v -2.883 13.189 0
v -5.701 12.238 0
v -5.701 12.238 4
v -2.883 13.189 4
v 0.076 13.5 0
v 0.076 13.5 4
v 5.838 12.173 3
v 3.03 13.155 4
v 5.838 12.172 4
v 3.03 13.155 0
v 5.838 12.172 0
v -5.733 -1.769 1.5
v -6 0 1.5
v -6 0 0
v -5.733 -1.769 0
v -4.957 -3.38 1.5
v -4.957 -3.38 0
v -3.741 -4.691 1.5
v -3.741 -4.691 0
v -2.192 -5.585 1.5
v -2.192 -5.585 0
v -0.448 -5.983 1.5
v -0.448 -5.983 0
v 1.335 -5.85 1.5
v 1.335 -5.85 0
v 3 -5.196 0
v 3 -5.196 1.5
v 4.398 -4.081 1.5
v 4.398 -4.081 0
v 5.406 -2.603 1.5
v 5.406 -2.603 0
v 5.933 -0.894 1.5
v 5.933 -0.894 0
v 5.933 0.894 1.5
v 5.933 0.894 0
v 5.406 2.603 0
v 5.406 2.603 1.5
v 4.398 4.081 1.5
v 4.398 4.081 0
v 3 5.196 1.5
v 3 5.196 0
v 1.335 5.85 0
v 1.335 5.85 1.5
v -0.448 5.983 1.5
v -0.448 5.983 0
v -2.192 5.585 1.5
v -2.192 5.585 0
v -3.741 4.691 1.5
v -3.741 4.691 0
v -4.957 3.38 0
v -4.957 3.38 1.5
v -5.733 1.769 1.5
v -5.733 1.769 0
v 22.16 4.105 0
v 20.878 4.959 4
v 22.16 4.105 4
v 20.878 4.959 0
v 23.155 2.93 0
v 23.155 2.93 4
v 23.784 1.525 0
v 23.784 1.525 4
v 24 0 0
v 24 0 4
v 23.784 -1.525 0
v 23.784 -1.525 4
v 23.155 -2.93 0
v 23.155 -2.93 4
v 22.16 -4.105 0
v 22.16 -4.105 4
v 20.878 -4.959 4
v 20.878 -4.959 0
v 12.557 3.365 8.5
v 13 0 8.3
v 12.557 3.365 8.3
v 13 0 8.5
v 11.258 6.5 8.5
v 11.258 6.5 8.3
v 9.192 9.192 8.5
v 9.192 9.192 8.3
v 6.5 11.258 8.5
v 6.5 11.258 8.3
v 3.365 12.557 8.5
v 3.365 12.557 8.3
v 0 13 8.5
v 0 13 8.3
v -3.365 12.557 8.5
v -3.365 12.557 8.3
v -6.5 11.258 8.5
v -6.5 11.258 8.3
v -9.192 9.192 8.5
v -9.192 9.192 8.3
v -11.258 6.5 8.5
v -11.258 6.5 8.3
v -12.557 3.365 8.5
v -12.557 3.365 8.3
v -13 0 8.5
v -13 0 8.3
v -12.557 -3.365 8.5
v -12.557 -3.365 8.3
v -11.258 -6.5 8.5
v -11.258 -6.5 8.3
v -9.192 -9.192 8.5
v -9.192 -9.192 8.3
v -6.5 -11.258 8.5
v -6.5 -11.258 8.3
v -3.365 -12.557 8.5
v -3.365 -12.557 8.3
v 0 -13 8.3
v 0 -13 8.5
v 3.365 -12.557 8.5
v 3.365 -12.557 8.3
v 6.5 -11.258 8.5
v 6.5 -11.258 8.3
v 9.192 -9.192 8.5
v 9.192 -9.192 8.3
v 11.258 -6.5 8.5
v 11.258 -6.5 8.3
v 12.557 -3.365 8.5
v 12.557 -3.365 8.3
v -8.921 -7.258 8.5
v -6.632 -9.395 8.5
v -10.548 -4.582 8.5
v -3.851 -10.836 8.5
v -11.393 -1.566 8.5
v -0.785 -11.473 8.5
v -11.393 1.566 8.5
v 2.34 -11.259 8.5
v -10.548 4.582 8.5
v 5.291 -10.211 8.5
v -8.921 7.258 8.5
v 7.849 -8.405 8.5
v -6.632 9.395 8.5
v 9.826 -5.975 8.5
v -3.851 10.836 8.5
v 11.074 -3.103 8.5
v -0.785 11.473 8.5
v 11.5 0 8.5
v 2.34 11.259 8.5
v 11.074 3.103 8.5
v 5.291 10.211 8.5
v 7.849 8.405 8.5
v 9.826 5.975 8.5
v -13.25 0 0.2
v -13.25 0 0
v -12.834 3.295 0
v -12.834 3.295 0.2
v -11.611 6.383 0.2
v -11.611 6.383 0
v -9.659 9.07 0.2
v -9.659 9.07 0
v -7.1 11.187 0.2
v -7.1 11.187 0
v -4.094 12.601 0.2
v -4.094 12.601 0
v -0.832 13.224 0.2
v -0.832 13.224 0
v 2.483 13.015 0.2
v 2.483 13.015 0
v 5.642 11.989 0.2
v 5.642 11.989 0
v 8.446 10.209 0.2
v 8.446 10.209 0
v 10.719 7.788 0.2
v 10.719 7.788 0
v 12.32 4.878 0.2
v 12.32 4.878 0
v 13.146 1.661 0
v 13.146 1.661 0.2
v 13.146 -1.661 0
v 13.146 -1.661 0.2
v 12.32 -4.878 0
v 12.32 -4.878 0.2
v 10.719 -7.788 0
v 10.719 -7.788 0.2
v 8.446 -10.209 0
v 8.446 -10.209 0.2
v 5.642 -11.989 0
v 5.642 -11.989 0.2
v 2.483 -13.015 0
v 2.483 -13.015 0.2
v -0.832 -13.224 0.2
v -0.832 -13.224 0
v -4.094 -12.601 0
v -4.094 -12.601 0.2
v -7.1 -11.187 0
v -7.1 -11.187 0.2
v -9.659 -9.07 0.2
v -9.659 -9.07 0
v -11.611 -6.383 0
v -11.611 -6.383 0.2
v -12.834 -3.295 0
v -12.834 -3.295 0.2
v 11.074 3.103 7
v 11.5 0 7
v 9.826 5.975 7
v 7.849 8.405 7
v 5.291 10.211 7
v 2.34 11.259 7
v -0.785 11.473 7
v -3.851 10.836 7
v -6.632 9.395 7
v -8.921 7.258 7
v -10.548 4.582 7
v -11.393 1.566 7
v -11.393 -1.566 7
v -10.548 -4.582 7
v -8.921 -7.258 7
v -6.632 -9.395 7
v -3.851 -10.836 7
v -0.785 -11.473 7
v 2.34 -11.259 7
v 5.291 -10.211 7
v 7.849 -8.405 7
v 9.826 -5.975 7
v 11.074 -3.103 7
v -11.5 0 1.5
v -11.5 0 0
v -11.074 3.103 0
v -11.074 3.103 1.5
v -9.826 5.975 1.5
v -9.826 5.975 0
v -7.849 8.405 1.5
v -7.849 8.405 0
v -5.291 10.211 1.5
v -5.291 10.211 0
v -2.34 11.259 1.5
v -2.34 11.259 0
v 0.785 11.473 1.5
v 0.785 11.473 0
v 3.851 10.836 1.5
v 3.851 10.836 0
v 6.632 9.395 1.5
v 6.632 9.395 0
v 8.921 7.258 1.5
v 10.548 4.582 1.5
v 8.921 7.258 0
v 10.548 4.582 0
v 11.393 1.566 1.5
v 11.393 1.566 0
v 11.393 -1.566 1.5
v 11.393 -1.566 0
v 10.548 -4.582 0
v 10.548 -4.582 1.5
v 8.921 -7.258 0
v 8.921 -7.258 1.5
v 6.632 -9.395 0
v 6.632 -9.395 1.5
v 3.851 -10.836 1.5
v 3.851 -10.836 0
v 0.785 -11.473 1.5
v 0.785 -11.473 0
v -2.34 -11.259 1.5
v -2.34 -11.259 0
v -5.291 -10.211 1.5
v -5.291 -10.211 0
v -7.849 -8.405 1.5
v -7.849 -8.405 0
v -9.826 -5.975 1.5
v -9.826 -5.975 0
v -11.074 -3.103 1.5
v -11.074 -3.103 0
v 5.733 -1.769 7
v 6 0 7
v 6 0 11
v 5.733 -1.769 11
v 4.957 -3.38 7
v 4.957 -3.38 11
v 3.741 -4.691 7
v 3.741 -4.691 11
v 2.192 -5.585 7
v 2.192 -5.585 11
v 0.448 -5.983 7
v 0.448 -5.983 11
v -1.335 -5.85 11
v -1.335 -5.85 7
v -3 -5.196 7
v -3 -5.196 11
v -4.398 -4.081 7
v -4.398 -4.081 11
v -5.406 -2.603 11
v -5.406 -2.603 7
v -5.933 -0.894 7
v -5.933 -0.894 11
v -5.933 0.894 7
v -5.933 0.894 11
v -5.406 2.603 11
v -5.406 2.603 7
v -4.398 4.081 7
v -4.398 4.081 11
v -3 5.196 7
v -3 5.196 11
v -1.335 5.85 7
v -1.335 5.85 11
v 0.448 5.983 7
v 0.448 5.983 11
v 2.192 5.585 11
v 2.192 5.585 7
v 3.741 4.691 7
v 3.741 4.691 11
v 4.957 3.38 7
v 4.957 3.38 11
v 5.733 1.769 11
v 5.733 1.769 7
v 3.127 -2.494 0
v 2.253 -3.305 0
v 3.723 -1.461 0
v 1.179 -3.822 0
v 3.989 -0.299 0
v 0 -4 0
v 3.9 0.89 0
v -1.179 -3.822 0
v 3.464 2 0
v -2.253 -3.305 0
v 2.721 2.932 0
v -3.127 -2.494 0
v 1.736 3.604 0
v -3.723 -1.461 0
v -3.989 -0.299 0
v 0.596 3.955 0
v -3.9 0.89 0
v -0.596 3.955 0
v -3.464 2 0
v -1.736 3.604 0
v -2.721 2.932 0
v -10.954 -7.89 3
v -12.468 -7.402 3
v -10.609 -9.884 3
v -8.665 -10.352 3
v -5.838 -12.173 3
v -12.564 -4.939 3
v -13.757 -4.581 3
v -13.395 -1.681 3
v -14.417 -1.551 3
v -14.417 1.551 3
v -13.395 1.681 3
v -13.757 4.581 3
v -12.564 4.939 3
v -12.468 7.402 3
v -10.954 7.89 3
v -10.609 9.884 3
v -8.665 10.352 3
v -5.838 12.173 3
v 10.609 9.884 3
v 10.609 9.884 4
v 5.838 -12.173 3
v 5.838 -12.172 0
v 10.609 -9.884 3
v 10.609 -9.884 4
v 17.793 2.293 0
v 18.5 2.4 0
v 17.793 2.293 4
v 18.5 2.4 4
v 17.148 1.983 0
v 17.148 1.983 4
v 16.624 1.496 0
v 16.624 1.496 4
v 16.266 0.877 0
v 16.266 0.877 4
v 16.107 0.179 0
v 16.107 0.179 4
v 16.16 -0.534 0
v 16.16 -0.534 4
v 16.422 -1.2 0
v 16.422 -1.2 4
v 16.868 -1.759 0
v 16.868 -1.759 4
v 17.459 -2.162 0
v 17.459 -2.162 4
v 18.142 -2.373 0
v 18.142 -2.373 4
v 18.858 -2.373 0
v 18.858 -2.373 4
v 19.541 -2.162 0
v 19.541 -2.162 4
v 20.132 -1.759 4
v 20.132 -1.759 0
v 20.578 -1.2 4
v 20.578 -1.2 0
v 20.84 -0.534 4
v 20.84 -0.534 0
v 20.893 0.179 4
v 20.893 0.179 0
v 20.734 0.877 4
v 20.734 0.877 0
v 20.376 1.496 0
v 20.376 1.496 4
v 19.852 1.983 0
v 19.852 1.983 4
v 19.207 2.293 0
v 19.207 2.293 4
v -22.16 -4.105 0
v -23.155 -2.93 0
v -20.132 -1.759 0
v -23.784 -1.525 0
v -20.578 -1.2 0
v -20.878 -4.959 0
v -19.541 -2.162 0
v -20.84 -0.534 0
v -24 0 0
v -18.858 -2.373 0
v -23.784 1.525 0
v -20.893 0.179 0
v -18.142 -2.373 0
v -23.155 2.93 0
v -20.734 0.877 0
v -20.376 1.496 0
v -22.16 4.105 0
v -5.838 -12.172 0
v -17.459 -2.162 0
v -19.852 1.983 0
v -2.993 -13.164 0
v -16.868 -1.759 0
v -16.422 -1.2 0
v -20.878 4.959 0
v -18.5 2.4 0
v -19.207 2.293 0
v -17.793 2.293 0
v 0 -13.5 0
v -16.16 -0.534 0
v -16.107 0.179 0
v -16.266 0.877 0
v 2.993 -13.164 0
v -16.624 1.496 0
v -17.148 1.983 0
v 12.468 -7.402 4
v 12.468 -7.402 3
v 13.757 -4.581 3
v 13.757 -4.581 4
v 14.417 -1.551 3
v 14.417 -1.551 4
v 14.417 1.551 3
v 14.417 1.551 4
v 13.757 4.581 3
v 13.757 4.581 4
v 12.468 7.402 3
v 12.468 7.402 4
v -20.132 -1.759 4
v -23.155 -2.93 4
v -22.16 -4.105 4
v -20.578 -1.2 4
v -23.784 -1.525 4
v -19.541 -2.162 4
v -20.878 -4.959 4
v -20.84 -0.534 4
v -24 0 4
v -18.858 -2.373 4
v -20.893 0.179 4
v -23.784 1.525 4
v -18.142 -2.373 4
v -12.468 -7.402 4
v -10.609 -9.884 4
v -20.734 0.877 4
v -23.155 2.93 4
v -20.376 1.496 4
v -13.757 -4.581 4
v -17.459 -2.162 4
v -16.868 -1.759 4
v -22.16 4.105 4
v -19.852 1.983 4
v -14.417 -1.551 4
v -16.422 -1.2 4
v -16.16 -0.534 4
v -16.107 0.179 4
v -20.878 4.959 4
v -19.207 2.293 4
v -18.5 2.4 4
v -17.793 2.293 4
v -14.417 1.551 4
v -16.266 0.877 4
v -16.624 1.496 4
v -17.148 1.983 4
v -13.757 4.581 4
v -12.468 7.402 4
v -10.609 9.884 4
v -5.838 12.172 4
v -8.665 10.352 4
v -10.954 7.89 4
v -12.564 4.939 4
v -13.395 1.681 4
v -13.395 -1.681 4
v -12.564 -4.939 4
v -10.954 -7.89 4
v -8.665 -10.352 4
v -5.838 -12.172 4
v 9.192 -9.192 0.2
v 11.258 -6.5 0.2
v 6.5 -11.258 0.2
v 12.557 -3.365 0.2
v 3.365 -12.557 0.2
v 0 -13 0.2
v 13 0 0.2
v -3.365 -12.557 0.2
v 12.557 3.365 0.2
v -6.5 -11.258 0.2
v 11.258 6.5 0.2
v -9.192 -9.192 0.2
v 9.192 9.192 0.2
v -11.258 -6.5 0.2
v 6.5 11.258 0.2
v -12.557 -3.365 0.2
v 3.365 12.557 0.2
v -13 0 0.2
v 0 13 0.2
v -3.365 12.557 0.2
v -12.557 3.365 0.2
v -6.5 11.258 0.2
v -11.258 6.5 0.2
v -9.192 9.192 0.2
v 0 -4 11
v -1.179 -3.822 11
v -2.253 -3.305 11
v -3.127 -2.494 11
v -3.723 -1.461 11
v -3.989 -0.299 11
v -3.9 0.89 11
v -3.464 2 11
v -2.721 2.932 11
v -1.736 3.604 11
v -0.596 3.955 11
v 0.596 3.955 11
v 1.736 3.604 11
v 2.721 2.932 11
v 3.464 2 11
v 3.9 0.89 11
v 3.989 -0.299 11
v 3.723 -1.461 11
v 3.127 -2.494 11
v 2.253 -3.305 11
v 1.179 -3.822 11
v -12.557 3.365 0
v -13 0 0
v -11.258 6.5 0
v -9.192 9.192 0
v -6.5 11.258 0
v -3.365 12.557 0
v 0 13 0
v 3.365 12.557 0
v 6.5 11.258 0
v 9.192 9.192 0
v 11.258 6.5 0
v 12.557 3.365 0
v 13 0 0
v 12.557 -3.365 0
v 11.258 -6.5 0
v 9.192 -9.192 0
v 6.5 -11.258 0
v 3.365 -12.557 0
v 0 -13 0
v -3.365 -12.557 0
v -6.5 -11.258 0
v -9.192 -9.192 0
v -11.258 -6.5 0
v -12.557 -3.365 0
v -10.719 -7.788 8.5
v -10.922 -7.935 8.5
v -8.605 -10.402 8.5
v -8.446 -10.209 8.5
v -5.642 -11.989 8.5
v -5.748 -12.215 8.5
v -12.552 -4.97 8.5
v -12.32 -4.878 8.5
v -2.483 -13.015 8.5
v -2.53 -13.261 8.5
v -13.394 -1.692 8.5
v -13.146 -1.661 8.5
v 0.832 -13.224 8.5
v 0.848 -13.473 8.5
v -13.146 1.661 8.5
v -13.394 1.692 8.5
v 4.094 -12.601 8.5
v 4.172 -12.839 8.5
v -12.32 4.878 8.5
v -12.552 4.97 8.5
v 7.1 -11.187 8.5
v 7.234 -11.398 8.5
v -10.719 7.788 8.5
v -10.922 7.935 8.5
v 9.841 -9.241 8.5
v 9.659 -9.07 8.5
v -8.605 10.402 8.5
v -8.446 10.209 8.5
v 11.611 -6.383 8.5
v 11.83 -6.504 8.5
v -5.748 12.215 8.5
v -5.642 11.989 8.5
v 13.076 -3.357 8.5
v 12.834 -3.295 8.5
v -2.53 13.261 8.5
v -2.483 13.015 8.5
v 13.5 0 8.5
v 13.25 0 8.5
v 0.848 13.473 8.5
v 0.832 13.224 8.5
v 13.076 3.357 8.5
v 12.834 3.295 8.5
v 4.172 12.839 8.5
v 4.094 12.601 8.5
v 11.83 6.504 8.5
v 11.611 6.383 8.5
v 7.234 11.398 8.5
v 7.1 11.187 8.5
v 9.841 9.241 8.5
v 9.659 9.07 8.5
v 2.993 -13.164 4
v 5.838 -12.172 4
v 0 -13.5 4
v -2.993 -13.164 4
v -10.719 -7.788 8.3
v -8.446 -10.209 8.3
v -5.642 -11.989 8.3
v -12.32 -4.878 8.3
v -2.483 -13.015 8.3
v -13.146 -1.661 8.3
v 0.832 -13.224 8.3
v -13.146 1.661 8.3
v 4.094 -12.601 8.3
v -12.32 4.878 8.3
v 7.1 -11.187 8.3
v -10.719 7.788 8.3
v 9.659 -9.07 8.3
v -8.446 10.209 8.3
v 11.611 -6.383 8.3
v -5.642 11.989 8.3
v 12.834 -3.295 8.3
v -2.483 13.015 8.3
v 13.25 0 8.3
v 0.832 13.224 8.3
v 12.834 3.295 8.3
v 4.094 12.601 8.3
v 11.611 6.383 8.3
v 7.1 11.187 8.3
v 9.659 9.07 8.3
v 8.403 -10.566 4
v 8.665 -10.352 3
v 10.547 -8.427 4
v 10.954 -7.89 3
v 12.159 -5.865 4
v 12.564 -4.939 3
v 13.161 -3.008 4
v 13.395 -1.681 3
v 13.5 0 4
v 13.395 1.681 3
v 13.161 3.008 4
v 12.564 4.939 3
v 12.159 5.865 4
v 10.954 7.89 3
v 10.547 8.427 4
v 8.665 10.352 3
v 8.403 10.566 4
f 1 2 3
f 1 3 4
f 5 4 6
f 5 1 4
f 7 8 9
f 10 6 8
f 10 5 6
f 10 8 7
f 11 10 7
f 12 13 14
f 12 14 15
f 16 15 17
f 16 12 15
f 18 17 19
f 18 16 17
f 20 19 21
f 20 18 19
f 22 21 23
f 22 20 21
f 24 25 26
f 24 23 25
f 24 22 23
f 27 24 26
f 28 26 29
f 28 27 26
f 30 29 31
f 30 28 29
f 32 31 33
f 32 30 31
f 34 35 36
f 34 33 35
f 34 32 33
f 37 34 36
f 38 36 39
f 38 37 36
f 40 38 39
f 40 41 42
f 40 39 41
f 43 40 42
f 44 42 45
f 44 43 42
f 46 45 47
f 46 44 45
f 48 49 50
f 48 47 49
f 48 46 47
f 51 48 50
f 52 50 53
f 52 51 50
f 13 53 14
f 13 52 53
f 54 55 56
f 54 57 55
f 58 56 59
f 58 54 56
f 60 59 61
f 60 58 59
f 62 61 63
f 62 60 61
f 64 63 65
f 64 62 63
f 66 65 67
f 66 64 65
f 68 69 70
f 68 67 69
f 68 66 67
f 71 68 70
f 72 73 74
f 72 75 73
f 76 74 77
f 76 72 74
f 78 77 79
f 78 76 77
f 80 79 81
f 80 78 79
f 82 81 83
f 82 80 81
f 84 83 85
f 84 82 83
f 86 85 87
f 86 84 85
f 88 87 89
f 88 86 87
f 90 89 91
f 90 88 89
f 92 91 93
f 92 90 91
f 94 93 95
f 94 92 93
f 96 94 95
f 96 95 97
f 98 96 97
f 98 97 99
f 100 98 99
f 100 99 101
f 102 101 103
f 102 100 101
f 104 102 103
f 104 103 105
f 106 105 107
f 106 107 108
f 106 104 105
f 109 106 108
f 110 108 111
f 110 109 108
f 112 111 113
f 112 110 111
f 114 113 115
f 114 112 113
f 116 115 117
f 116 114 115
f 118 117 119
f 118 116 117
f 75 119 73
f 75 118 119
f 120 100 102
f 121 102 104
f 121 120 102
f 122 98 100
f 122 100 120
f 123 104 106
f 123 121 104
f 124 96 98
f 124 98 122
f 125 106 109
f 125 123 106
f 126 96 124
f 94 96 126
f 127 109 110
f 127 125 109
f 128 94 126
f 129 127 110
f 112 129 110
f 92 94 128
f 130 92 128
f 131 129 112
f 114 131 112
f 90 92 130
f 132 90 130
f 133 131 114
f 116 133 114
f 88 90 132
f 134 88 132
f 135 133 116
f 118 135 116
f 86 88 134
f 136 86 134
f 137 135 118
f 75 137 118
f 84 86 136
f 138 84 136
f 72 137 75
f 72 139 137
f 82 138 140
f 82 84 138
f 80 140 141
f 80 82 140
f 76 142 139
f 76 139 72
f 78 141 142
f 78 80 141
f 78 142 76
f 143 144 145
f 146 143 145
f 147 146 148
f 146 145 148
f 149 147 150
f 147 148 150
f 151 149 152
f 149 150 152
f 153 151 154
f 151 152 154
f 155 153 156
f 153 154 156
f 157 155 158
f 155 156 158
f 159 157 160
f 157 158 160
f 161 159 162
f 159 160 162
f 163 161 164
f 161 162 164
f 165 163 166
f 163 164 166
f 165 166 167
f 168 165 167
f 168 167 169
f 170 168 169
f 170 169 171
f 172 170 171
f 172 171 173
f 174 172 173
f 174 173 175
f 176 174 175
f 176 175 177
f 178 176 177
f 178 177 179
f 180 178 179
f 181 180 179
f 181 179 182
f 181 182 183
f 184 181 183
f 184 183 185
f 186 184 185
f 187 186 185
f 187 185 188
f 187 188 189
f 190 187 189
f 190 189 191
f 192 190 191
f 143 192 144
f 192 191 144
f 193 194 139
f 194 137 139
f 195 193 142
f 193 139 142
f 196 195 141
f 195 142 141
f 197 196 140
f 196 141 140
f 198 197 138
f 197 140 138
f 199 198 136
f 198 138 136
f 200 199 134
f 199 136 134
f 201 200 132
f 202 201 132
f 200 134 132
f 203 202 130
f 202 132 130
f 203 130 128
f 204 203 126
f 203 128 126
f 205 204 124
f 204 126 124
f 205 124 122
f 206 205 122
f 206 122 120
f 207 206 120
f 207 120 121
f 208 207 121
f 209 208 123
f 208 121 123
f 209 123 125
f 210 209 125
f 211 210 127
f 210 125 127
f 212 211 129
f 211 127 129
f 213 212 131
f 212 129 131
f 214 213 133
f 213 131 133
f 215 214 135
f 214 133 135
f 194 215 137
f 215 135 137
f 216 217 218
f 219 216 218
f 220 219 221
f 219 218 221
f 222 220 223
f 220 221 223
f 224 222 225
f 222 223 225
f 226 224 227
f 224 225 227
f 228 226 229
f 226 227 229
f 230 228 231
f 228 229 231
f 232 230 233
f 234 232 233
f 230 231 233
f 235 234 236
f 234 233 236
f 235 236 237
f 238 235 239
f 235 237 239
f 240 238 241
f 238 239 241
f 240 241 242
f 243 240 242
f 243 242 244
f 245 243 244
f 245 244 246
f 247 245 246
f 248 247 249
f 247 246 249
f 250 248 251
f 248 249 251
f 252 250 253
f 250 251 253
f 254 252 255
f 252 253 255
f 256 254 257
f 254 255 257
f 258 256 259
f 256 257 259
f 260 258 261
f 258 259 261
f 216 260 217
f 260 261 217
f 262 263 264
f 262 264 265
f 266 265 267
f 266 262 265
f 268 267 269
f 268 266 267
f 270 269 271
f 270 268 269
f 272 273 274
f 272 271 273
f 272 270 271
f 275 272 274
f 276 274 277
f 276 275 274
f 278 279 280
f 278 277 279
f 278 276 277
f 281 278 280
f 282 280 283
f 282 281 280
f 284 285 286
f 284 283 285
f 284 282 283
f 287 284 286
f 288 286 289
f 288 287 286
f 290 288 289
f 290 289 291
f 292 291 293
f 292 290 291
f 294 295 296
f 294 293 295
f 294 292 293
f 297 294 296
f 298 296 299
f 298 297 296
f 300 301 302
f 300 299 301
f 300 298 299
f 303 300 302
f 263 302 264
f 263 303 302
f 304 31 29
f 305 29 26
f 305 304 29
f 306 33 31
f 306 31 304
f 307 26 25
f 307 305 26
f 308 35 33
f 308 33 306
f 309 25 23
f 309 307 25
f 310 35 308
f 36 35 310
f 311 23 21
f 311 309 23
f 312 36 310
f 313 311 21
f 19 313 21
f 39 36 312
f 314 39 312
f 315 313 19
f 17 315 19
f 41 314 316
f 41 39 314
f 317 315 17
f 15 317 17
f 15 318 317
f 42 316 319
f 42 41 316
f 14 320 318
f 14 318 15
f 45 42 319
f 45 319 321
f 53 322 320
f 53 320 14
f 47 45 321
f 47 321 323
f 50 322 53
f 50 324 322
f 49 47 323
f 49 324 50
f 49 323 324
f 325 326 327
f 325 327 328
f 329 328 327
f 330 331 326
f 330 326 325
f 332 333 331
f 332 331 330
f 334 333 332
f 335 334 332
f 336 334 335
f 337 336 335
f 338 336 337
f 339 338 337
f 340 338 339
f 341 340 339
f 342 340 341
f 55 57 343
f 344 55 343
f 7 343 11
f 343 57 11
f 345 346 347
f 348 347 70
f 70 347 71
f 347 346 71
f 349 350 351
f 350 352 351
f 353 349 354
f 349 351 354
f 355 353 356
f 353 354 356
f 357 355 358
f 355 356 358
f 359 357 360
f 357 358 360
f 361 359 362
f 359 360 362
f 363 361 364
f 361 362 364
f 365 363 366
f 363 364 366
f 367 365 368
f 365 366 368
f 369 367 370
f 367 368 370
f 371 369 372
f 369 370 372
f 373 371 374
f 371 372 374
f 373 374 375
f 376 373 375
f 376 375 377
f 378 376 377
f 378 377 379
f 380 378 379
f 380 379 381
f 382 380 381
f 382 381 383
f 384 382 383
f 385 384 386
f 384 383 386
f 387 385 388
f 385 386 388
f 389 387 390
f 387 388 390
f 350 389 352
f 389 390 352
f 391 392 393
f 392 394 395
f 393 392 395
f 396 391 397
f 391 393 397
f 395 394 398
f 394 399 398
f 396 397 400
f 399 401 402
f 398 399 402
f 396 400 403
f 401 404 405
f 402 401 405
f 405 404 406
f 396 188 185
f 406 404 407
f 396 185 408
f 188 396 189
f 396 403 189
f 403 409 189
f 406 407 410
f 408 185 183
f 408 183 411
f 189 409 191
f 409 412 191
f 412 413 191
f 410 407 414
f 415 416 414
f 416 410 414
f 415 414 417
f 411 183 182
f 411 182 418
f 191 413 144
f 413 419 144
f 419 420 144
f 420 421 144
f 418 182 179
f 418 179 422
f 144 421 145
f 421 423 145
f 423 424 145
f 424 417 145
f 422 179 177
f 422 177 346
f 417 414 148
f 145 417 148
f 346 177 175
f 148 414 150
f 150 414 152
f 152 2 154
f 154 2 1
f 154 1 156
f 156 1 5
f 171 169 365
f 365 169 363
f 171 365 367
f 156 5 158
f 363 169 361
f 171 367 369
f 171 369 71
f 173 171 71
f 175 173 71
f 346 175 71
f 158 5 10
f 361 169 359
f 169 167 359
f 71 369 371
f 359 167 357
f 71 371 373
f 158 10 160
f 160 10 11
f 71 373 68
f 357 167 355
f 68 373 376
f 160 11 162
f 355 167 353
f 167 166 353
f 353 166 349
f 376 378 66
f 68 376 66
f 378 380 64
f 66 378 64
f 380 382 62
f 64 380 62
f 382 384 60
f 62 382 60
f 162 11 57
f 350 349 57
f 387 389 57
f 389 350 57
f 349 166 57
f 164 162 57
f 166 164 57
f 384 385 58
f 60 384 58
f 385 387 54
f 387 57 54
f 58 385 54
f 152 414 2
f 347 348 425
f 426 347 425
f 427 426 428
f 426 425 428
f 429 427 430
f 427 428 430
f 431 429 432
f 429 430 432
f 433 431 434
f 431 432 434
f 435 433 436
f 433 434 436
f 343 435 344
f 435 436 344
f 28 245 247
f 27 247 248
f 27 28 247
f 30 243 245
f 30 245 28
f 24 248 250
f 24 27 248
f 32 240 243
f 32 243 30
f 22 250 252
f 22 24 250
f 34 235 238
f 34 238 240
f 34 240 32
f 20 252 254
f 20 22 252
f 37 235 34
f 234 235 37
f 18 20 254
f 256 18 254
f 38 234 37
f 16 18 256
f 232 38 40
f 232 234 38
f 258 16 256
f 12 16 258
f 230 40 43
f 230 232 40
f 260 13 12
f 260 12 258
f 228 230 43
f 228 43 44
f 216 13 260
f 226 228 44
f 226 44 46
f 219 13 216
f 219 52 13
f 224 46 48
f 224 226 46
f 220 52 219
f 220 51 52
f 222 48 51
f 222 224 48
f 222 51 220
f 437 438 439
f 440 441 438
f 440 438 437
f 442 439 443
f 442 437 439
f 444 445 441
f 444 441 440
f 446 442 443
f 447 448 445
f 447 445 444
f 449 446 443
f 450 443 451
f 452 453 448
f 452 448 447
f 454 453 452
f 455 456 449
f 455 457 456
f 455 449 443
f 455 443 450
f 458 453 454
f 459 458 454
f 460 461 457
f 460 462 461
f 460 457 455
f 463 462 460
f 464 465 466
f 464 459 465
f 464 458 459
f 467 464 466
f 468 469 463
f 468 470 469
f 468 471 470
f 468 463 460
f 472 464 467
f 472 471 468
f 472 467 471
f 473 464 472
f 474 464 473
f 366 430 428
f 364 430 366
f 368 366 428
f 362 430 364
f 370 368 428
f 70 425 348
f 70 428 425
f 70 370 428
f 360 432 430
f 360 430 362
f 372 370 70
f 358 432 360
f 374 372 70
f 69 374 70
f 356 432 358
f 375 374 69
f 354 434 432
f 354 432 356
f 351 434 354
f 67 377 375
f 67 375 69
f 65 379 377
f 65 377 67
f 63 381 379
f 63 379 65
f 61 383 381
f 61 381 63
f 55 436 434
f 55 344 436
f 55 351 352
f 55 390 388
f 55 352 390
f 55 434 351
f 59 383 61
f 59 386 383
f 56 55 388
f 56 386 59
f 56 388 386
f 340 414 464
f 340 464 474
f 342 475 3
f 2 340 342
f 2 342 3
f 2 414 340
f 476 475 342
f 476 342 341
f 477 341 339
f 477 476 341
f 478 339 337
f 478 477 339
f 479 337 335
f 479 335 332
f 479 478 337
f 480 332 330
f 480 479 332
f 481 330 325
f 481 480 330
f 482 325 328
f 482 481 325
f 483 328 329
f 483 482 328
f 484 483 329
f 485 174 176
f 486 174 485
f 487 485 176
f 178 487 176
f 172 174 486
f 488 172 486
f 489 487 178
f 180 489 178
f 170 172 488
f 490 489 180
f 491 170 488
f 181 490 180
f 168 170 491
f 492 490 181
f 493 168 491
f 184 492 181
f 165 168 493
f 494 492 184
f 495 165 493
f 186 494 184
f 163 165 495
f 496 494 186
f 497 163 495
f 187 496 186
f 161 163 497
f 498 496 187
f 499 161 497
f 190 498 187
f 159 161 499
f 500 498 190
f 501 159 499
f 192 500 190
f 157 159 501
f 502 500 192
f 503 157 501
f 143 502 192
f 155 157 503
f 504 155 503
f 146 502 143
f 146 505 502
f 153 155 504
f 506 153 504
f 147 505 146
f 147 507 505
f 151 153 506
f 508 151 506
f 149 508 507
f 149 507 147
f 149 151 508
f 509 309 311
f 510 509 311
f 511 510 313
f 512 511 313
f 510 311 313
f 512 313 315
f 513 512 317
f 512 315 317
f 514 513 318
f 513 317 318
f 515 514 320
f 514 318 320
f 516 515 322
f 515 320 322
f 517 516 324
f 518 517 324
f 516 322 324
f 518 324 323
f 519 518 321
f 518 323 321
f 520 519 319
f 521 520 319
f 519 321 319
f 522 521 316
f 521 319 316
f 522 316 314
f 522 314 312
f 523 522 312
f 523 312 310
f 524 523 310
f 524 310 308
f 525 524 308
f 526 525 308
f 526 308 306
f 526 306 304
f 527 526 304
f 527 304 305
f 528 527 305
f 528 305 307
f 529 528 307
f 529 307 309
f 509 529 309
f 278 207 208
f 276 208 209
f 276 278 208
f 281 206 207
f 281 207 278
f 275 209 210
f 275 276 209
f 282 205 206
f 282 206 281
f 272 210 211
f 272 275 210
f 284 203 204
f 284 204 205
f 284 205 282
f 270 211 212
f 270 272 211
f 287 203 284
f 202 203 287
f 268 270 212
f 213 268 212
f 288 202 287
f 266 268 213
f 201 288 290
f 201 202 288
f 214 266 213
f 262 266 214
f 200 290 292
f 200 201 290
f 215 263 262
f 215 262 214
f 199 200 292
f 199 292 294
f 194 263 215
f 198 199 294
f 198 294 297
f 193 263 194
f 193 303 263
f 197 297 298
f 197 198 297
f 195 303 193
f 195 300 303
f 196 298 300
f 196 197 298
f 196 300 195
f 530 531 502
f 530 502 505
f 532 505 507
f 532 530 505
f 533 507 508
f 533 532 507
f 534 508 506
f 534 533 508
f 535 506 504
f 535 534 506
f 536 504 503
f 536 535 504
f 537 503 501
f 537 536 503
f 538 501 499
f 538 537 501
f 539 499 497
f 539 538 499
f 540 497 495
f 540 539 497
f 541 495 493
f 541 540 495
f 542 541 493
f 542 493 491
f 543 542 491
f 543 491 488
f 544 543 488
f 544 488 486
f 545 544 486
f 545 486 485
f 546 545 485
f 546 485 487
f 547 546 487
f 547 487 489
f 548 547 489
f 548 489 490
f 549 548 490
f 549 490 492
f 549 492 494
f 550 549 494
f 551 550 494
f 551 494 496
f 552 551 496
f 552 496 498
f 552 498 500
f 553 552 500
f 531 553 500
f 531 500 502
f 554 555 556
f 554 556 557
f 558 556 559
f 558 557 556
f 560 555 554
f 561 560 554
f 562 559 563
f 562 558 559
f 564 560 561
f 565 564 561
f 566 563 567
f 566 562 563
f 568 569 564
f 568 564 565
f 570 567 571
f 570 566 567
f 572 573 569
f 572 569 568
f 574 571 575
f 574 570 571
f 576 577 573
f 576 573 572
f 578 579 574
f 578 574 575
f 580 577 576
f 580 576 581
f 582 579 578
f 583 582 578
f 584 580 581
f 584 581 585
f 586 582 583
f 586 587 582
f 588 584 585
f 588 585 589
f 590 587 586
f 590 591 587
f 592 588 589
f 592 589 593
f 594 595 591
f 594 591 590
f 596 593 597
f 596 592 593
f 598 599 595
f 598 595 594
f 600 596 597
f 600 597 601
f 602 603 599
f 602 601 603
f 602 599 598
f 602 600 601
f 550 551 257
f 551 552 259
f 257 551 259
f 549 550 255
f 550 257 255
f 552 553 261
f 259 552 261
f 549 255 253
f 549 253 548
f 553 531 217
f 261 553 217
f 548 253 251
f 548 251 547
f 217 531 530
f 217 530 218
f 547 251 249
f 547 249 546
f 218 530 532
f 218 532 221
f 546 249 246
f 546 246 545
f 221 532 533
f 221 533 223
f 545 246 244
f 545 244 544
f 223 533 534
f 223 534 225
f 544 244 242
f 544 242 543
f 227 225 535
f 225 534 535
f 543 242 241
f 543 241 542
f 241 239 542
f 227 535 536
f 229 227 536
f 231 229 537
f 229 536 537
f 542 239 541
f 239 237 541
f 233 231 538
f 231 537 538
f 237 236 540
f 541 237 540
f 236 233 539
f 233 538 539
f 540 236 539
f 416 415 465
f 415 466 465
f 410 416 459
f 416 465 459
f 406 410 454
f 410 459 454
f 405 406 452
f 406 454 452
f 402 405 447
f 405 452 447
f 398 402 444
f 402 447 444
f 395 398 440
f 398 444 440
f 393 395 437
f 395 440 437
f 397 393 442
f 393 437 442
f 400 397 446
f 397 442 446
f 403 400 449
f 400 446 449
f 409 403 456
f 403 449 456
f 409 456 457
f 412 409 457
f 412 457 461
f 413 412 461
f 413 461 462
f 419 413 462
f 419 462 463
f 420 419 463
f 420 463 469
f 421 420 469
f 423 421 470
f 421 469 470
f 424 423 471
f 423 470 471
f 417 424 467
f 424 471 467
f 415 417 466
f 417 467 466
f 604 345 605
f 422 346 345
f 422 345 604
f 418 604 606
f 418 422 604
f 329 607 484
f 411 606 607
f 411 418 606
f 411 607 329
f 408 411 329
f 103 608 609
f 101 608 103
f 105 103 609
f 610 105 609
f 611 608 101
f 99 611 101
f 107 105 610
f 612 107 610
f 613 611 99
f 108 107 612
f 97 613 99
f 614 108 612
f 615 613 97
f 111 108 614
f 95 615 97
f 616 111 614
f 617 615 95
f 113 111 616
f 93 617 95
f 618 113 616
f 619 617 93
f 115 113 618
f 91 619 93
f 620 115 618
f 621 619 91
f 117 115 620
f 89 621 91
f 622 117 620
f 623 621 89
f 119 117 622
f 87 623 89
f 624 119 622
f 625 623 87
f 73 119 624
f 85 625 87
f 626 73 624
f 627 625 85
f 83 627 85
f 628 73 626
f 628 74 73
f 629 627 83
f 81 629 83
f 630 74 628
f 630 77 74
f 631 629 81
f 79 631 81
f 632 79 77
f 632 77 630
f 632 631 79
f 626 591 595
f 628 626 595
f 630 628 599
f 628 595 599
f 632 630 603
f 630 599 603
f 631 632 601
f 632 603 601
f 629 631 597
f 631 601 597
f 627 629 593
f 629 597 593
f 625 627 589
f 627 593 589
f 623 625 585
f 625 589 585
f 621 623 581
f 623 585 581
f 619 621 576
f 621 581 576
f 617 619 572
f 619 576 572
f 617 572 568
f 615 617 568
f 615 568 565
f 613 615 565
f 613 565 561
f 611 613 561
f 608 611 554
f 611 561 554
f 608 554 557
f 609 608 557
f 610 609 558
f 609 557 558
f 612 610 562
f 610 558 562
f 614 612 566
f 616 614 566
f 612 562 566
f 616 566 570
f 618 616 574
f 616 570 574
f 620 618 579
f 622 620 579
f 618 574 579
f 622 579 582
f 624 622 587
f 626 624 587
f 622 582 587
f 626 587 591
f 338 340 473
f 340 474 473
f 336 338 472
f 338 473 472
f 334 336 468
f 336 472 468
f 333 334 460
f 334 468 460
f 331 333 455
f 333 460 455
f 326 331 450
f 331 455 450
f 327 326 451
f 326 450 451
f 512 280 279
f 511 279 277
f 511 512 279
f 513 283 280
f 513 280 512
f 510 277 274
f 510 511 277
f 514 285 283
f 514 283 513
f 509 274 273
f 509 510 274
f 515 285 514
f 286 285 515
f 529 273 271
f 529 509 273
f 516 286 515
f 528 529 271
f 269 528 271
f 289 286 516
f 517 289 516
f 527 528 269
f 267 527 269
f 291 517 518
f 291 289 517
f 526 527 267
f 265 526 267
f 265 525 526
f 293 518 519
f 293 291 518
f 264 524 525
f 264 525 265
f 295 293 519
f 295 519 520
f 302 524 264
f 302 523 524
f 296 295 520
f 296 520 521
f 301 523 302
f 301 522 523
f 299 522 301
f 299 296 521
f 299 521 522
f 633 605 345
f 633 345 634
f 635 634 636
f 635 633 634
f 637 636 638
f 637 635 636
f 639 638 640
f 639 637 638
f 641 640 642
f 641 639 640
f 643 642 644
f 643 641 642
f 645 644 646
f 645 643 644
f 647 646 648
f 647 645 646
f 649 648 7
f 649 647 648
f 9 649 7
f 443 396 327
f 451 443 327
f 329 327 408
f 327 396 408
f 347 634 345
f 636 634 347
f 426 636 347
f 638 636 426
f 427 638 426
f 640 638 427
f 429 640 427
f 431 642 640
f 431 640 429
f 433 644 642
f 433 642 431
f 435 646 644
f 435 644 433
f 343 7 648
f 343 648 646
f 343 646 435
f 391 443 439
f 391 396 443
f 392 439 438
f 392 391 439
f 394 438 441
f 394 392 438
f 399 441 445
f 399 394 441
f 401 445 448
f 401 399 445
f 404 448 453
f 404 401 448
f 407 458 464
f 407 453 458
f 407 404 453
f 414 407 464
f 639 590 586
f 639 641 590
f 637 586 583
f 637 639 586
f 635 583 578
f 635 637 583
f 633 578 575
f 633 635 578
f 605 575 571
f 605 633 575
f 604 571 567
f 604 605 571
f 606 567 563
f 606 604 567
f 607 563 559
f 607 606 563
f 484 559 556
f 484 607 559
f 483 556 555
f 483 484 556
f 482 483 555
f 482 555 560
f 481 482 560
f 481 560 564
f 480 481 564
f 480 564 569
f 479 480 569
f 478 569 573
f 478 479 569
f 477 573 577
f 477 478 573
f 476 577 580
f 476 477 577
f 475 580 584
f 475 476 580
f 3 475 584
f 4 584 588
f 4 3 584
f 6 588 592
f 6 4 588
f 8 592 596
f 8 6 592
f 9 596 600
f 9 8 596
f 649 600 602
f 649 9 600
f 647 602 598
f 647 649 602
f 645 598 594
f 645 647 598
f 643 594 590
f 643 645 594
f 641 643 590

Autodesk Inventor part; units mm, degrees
ref_plane "YZ Plane" through (0, 0, 0) normal (1, 0, 0) x (0, 1, 0)
ref_plane "XZ Plane" through (0, 0, 0) normal (0, 1, 0) x (-1, 0, 0)
ref_plane "XY Plane" through (0, 0, 0) normal (0, 0, 1) x (1, 0, 0)
sketch "Esboço1" plane through (0, 0, 0) normal (0, 0, 1) x (1, 0, 0)
  line L0 (-18.5, 0) -> (18.5, 0) construction
  line L1 (-24, 0) -> (24, 0) construction
  line L2 (-20.8784, 4.9592) -> (-5.7013, 12.238)
  line L3 (20.8784, 4.9592) -> (5.8378, 12.1725)
  line L4 (-20.8784, -4.9592) -> (-5.5742, -12.299)
  line L5 (5.8378, -12.1725) -> (20.8784, -4.9592)
  arc A0 (20.8784, -4.9592) -> (20.8784, 4.9592) centre (18.5, 0) ccw
  arc A1 (-5.8378, -12.1725) -> (5.8378, -12.1725) centre (0, 0) ccw
  arc A2 (5.8378, 12.1725) -> (-5.8378, 12.1725) centre (0, 0) ccw
  arc A3 (-20.8784, 4.9592) -> (-20.8784, -4.9592) centre (-18.5, 0) ccw
  dimension "d1" = 37
  dimension "d2" = 48
extrude "Extrusão1" add sketch "Esboço1" along normal blind 4
sketch "Esboço2" plane through (0, 0, 4) normal (0, 0, 1) x (1, 0, 0)
  circle A0 centre (0, 0) radius 13.5
  circle A1 centre (0, 0) radius 14.5
  dimension "d5" = 27
  dimension "d6" = 29
extrude "Extrusão2" cut sketch "Esboço2" against normal blind 1
sketch "Esboço3" plane through (0, 0, 4) normal (0, 0, 1) x (1, 0, 0)
  circle A0 centre (0, 0) radius 13.5
  dimension "d9" = 27
extrude "Extrusão3" add sketch "Esboço3" along normal blind 4.5
sketch "Esboço4" plane through (0, 0, 8.5) normal (0, 0, 1) x (1, 0, 0)
  circle A0 centre (0, 0) radius 11.5
  dimension "d12" = 23
extrude "Extrusão4" cut sketch "Esboço4" against normal blind 1.5
sketch "Esboço5" plane through (0, 0, 0) normal (0, 0, -1) x (-1, 0, 0)
  circle A0 centre (0, 0) radius 11.5
  dimension "d15" = 23
extrude "Extrusão5" cut sketch "Esboço5" against normal blind 1.5
sketch "Esboço6" plane through (0, 0, 8.5) normal (0, 0, 1) x (1, 0, 0)
  circle A0 centre (0, 0) radius 13
  circle A1 centre (0, 0) radius 13.25
  dimension "d18" = 26
  dimension "d19" = 26.5
extrude "Extrusão6" cut sketch "Esboço6" against normal blind 0.2
sketch "Esboço8" plane through (0, 0, 0) normal (0, 0, -1) x (-1, 0, 0)
  circle A0 centre (0, 0) radius 13
  circle A1 centre (0, 0) radius 13.25
  dimension "d22" = 26
  dimension "d23" = 26.5
extrude "Extrusão7" cut sketch "Esboço8" against normal blind 0.2
sketch "Esboço9" plane through (0, 0, 7) normal (0, 0, 1) x (1, 0, 0)
  circle A0 centre (0, 0) radius 6
  dimension "d26" = 12
extrude "Extrusão8" add sketch "Esboço9" along normal blind 4
sketch "Esboço10" plane through (0, 0, 1.5) normal (0, 0, -1) x (-1, 0, 0)
  circle A0 centre (0, 0) radius 6
  dimension "d29" = 12
extrude "Extrusão9" add sketch "Esboço10" along normal blind 1.5
sketch "Esboço11" plane through (0, 0, 11) normal (0, 0, 1) x (1, 0, 0)
  circle A0 centre (0, 0) radius 2.3758
hole "Furo1" at (0, 0, 11) direction (0, 0, -1) diameter 8 end through all
sketch "Esboço12" plane through (0, 0, 0) normal (0, 0, -1) x (-1, 0, 0)
  line L0 (18.5, 0) -> (-18.5, 0) construction
  circle A0 centre (18.5, 0) radius 0.9755 construction
  circle A1 centre (-18.5, 0) radius 0.8896 construction
  point P0 (0, 0)
  point P1 (0, 0)
  dimension "d39" = 37
hole "Furo2" at (-18.5, 0, 0) at (18.5, 0, 0) direction (0, 0, 1) diameter 4.8 end through all
properties part number "KFL08"
